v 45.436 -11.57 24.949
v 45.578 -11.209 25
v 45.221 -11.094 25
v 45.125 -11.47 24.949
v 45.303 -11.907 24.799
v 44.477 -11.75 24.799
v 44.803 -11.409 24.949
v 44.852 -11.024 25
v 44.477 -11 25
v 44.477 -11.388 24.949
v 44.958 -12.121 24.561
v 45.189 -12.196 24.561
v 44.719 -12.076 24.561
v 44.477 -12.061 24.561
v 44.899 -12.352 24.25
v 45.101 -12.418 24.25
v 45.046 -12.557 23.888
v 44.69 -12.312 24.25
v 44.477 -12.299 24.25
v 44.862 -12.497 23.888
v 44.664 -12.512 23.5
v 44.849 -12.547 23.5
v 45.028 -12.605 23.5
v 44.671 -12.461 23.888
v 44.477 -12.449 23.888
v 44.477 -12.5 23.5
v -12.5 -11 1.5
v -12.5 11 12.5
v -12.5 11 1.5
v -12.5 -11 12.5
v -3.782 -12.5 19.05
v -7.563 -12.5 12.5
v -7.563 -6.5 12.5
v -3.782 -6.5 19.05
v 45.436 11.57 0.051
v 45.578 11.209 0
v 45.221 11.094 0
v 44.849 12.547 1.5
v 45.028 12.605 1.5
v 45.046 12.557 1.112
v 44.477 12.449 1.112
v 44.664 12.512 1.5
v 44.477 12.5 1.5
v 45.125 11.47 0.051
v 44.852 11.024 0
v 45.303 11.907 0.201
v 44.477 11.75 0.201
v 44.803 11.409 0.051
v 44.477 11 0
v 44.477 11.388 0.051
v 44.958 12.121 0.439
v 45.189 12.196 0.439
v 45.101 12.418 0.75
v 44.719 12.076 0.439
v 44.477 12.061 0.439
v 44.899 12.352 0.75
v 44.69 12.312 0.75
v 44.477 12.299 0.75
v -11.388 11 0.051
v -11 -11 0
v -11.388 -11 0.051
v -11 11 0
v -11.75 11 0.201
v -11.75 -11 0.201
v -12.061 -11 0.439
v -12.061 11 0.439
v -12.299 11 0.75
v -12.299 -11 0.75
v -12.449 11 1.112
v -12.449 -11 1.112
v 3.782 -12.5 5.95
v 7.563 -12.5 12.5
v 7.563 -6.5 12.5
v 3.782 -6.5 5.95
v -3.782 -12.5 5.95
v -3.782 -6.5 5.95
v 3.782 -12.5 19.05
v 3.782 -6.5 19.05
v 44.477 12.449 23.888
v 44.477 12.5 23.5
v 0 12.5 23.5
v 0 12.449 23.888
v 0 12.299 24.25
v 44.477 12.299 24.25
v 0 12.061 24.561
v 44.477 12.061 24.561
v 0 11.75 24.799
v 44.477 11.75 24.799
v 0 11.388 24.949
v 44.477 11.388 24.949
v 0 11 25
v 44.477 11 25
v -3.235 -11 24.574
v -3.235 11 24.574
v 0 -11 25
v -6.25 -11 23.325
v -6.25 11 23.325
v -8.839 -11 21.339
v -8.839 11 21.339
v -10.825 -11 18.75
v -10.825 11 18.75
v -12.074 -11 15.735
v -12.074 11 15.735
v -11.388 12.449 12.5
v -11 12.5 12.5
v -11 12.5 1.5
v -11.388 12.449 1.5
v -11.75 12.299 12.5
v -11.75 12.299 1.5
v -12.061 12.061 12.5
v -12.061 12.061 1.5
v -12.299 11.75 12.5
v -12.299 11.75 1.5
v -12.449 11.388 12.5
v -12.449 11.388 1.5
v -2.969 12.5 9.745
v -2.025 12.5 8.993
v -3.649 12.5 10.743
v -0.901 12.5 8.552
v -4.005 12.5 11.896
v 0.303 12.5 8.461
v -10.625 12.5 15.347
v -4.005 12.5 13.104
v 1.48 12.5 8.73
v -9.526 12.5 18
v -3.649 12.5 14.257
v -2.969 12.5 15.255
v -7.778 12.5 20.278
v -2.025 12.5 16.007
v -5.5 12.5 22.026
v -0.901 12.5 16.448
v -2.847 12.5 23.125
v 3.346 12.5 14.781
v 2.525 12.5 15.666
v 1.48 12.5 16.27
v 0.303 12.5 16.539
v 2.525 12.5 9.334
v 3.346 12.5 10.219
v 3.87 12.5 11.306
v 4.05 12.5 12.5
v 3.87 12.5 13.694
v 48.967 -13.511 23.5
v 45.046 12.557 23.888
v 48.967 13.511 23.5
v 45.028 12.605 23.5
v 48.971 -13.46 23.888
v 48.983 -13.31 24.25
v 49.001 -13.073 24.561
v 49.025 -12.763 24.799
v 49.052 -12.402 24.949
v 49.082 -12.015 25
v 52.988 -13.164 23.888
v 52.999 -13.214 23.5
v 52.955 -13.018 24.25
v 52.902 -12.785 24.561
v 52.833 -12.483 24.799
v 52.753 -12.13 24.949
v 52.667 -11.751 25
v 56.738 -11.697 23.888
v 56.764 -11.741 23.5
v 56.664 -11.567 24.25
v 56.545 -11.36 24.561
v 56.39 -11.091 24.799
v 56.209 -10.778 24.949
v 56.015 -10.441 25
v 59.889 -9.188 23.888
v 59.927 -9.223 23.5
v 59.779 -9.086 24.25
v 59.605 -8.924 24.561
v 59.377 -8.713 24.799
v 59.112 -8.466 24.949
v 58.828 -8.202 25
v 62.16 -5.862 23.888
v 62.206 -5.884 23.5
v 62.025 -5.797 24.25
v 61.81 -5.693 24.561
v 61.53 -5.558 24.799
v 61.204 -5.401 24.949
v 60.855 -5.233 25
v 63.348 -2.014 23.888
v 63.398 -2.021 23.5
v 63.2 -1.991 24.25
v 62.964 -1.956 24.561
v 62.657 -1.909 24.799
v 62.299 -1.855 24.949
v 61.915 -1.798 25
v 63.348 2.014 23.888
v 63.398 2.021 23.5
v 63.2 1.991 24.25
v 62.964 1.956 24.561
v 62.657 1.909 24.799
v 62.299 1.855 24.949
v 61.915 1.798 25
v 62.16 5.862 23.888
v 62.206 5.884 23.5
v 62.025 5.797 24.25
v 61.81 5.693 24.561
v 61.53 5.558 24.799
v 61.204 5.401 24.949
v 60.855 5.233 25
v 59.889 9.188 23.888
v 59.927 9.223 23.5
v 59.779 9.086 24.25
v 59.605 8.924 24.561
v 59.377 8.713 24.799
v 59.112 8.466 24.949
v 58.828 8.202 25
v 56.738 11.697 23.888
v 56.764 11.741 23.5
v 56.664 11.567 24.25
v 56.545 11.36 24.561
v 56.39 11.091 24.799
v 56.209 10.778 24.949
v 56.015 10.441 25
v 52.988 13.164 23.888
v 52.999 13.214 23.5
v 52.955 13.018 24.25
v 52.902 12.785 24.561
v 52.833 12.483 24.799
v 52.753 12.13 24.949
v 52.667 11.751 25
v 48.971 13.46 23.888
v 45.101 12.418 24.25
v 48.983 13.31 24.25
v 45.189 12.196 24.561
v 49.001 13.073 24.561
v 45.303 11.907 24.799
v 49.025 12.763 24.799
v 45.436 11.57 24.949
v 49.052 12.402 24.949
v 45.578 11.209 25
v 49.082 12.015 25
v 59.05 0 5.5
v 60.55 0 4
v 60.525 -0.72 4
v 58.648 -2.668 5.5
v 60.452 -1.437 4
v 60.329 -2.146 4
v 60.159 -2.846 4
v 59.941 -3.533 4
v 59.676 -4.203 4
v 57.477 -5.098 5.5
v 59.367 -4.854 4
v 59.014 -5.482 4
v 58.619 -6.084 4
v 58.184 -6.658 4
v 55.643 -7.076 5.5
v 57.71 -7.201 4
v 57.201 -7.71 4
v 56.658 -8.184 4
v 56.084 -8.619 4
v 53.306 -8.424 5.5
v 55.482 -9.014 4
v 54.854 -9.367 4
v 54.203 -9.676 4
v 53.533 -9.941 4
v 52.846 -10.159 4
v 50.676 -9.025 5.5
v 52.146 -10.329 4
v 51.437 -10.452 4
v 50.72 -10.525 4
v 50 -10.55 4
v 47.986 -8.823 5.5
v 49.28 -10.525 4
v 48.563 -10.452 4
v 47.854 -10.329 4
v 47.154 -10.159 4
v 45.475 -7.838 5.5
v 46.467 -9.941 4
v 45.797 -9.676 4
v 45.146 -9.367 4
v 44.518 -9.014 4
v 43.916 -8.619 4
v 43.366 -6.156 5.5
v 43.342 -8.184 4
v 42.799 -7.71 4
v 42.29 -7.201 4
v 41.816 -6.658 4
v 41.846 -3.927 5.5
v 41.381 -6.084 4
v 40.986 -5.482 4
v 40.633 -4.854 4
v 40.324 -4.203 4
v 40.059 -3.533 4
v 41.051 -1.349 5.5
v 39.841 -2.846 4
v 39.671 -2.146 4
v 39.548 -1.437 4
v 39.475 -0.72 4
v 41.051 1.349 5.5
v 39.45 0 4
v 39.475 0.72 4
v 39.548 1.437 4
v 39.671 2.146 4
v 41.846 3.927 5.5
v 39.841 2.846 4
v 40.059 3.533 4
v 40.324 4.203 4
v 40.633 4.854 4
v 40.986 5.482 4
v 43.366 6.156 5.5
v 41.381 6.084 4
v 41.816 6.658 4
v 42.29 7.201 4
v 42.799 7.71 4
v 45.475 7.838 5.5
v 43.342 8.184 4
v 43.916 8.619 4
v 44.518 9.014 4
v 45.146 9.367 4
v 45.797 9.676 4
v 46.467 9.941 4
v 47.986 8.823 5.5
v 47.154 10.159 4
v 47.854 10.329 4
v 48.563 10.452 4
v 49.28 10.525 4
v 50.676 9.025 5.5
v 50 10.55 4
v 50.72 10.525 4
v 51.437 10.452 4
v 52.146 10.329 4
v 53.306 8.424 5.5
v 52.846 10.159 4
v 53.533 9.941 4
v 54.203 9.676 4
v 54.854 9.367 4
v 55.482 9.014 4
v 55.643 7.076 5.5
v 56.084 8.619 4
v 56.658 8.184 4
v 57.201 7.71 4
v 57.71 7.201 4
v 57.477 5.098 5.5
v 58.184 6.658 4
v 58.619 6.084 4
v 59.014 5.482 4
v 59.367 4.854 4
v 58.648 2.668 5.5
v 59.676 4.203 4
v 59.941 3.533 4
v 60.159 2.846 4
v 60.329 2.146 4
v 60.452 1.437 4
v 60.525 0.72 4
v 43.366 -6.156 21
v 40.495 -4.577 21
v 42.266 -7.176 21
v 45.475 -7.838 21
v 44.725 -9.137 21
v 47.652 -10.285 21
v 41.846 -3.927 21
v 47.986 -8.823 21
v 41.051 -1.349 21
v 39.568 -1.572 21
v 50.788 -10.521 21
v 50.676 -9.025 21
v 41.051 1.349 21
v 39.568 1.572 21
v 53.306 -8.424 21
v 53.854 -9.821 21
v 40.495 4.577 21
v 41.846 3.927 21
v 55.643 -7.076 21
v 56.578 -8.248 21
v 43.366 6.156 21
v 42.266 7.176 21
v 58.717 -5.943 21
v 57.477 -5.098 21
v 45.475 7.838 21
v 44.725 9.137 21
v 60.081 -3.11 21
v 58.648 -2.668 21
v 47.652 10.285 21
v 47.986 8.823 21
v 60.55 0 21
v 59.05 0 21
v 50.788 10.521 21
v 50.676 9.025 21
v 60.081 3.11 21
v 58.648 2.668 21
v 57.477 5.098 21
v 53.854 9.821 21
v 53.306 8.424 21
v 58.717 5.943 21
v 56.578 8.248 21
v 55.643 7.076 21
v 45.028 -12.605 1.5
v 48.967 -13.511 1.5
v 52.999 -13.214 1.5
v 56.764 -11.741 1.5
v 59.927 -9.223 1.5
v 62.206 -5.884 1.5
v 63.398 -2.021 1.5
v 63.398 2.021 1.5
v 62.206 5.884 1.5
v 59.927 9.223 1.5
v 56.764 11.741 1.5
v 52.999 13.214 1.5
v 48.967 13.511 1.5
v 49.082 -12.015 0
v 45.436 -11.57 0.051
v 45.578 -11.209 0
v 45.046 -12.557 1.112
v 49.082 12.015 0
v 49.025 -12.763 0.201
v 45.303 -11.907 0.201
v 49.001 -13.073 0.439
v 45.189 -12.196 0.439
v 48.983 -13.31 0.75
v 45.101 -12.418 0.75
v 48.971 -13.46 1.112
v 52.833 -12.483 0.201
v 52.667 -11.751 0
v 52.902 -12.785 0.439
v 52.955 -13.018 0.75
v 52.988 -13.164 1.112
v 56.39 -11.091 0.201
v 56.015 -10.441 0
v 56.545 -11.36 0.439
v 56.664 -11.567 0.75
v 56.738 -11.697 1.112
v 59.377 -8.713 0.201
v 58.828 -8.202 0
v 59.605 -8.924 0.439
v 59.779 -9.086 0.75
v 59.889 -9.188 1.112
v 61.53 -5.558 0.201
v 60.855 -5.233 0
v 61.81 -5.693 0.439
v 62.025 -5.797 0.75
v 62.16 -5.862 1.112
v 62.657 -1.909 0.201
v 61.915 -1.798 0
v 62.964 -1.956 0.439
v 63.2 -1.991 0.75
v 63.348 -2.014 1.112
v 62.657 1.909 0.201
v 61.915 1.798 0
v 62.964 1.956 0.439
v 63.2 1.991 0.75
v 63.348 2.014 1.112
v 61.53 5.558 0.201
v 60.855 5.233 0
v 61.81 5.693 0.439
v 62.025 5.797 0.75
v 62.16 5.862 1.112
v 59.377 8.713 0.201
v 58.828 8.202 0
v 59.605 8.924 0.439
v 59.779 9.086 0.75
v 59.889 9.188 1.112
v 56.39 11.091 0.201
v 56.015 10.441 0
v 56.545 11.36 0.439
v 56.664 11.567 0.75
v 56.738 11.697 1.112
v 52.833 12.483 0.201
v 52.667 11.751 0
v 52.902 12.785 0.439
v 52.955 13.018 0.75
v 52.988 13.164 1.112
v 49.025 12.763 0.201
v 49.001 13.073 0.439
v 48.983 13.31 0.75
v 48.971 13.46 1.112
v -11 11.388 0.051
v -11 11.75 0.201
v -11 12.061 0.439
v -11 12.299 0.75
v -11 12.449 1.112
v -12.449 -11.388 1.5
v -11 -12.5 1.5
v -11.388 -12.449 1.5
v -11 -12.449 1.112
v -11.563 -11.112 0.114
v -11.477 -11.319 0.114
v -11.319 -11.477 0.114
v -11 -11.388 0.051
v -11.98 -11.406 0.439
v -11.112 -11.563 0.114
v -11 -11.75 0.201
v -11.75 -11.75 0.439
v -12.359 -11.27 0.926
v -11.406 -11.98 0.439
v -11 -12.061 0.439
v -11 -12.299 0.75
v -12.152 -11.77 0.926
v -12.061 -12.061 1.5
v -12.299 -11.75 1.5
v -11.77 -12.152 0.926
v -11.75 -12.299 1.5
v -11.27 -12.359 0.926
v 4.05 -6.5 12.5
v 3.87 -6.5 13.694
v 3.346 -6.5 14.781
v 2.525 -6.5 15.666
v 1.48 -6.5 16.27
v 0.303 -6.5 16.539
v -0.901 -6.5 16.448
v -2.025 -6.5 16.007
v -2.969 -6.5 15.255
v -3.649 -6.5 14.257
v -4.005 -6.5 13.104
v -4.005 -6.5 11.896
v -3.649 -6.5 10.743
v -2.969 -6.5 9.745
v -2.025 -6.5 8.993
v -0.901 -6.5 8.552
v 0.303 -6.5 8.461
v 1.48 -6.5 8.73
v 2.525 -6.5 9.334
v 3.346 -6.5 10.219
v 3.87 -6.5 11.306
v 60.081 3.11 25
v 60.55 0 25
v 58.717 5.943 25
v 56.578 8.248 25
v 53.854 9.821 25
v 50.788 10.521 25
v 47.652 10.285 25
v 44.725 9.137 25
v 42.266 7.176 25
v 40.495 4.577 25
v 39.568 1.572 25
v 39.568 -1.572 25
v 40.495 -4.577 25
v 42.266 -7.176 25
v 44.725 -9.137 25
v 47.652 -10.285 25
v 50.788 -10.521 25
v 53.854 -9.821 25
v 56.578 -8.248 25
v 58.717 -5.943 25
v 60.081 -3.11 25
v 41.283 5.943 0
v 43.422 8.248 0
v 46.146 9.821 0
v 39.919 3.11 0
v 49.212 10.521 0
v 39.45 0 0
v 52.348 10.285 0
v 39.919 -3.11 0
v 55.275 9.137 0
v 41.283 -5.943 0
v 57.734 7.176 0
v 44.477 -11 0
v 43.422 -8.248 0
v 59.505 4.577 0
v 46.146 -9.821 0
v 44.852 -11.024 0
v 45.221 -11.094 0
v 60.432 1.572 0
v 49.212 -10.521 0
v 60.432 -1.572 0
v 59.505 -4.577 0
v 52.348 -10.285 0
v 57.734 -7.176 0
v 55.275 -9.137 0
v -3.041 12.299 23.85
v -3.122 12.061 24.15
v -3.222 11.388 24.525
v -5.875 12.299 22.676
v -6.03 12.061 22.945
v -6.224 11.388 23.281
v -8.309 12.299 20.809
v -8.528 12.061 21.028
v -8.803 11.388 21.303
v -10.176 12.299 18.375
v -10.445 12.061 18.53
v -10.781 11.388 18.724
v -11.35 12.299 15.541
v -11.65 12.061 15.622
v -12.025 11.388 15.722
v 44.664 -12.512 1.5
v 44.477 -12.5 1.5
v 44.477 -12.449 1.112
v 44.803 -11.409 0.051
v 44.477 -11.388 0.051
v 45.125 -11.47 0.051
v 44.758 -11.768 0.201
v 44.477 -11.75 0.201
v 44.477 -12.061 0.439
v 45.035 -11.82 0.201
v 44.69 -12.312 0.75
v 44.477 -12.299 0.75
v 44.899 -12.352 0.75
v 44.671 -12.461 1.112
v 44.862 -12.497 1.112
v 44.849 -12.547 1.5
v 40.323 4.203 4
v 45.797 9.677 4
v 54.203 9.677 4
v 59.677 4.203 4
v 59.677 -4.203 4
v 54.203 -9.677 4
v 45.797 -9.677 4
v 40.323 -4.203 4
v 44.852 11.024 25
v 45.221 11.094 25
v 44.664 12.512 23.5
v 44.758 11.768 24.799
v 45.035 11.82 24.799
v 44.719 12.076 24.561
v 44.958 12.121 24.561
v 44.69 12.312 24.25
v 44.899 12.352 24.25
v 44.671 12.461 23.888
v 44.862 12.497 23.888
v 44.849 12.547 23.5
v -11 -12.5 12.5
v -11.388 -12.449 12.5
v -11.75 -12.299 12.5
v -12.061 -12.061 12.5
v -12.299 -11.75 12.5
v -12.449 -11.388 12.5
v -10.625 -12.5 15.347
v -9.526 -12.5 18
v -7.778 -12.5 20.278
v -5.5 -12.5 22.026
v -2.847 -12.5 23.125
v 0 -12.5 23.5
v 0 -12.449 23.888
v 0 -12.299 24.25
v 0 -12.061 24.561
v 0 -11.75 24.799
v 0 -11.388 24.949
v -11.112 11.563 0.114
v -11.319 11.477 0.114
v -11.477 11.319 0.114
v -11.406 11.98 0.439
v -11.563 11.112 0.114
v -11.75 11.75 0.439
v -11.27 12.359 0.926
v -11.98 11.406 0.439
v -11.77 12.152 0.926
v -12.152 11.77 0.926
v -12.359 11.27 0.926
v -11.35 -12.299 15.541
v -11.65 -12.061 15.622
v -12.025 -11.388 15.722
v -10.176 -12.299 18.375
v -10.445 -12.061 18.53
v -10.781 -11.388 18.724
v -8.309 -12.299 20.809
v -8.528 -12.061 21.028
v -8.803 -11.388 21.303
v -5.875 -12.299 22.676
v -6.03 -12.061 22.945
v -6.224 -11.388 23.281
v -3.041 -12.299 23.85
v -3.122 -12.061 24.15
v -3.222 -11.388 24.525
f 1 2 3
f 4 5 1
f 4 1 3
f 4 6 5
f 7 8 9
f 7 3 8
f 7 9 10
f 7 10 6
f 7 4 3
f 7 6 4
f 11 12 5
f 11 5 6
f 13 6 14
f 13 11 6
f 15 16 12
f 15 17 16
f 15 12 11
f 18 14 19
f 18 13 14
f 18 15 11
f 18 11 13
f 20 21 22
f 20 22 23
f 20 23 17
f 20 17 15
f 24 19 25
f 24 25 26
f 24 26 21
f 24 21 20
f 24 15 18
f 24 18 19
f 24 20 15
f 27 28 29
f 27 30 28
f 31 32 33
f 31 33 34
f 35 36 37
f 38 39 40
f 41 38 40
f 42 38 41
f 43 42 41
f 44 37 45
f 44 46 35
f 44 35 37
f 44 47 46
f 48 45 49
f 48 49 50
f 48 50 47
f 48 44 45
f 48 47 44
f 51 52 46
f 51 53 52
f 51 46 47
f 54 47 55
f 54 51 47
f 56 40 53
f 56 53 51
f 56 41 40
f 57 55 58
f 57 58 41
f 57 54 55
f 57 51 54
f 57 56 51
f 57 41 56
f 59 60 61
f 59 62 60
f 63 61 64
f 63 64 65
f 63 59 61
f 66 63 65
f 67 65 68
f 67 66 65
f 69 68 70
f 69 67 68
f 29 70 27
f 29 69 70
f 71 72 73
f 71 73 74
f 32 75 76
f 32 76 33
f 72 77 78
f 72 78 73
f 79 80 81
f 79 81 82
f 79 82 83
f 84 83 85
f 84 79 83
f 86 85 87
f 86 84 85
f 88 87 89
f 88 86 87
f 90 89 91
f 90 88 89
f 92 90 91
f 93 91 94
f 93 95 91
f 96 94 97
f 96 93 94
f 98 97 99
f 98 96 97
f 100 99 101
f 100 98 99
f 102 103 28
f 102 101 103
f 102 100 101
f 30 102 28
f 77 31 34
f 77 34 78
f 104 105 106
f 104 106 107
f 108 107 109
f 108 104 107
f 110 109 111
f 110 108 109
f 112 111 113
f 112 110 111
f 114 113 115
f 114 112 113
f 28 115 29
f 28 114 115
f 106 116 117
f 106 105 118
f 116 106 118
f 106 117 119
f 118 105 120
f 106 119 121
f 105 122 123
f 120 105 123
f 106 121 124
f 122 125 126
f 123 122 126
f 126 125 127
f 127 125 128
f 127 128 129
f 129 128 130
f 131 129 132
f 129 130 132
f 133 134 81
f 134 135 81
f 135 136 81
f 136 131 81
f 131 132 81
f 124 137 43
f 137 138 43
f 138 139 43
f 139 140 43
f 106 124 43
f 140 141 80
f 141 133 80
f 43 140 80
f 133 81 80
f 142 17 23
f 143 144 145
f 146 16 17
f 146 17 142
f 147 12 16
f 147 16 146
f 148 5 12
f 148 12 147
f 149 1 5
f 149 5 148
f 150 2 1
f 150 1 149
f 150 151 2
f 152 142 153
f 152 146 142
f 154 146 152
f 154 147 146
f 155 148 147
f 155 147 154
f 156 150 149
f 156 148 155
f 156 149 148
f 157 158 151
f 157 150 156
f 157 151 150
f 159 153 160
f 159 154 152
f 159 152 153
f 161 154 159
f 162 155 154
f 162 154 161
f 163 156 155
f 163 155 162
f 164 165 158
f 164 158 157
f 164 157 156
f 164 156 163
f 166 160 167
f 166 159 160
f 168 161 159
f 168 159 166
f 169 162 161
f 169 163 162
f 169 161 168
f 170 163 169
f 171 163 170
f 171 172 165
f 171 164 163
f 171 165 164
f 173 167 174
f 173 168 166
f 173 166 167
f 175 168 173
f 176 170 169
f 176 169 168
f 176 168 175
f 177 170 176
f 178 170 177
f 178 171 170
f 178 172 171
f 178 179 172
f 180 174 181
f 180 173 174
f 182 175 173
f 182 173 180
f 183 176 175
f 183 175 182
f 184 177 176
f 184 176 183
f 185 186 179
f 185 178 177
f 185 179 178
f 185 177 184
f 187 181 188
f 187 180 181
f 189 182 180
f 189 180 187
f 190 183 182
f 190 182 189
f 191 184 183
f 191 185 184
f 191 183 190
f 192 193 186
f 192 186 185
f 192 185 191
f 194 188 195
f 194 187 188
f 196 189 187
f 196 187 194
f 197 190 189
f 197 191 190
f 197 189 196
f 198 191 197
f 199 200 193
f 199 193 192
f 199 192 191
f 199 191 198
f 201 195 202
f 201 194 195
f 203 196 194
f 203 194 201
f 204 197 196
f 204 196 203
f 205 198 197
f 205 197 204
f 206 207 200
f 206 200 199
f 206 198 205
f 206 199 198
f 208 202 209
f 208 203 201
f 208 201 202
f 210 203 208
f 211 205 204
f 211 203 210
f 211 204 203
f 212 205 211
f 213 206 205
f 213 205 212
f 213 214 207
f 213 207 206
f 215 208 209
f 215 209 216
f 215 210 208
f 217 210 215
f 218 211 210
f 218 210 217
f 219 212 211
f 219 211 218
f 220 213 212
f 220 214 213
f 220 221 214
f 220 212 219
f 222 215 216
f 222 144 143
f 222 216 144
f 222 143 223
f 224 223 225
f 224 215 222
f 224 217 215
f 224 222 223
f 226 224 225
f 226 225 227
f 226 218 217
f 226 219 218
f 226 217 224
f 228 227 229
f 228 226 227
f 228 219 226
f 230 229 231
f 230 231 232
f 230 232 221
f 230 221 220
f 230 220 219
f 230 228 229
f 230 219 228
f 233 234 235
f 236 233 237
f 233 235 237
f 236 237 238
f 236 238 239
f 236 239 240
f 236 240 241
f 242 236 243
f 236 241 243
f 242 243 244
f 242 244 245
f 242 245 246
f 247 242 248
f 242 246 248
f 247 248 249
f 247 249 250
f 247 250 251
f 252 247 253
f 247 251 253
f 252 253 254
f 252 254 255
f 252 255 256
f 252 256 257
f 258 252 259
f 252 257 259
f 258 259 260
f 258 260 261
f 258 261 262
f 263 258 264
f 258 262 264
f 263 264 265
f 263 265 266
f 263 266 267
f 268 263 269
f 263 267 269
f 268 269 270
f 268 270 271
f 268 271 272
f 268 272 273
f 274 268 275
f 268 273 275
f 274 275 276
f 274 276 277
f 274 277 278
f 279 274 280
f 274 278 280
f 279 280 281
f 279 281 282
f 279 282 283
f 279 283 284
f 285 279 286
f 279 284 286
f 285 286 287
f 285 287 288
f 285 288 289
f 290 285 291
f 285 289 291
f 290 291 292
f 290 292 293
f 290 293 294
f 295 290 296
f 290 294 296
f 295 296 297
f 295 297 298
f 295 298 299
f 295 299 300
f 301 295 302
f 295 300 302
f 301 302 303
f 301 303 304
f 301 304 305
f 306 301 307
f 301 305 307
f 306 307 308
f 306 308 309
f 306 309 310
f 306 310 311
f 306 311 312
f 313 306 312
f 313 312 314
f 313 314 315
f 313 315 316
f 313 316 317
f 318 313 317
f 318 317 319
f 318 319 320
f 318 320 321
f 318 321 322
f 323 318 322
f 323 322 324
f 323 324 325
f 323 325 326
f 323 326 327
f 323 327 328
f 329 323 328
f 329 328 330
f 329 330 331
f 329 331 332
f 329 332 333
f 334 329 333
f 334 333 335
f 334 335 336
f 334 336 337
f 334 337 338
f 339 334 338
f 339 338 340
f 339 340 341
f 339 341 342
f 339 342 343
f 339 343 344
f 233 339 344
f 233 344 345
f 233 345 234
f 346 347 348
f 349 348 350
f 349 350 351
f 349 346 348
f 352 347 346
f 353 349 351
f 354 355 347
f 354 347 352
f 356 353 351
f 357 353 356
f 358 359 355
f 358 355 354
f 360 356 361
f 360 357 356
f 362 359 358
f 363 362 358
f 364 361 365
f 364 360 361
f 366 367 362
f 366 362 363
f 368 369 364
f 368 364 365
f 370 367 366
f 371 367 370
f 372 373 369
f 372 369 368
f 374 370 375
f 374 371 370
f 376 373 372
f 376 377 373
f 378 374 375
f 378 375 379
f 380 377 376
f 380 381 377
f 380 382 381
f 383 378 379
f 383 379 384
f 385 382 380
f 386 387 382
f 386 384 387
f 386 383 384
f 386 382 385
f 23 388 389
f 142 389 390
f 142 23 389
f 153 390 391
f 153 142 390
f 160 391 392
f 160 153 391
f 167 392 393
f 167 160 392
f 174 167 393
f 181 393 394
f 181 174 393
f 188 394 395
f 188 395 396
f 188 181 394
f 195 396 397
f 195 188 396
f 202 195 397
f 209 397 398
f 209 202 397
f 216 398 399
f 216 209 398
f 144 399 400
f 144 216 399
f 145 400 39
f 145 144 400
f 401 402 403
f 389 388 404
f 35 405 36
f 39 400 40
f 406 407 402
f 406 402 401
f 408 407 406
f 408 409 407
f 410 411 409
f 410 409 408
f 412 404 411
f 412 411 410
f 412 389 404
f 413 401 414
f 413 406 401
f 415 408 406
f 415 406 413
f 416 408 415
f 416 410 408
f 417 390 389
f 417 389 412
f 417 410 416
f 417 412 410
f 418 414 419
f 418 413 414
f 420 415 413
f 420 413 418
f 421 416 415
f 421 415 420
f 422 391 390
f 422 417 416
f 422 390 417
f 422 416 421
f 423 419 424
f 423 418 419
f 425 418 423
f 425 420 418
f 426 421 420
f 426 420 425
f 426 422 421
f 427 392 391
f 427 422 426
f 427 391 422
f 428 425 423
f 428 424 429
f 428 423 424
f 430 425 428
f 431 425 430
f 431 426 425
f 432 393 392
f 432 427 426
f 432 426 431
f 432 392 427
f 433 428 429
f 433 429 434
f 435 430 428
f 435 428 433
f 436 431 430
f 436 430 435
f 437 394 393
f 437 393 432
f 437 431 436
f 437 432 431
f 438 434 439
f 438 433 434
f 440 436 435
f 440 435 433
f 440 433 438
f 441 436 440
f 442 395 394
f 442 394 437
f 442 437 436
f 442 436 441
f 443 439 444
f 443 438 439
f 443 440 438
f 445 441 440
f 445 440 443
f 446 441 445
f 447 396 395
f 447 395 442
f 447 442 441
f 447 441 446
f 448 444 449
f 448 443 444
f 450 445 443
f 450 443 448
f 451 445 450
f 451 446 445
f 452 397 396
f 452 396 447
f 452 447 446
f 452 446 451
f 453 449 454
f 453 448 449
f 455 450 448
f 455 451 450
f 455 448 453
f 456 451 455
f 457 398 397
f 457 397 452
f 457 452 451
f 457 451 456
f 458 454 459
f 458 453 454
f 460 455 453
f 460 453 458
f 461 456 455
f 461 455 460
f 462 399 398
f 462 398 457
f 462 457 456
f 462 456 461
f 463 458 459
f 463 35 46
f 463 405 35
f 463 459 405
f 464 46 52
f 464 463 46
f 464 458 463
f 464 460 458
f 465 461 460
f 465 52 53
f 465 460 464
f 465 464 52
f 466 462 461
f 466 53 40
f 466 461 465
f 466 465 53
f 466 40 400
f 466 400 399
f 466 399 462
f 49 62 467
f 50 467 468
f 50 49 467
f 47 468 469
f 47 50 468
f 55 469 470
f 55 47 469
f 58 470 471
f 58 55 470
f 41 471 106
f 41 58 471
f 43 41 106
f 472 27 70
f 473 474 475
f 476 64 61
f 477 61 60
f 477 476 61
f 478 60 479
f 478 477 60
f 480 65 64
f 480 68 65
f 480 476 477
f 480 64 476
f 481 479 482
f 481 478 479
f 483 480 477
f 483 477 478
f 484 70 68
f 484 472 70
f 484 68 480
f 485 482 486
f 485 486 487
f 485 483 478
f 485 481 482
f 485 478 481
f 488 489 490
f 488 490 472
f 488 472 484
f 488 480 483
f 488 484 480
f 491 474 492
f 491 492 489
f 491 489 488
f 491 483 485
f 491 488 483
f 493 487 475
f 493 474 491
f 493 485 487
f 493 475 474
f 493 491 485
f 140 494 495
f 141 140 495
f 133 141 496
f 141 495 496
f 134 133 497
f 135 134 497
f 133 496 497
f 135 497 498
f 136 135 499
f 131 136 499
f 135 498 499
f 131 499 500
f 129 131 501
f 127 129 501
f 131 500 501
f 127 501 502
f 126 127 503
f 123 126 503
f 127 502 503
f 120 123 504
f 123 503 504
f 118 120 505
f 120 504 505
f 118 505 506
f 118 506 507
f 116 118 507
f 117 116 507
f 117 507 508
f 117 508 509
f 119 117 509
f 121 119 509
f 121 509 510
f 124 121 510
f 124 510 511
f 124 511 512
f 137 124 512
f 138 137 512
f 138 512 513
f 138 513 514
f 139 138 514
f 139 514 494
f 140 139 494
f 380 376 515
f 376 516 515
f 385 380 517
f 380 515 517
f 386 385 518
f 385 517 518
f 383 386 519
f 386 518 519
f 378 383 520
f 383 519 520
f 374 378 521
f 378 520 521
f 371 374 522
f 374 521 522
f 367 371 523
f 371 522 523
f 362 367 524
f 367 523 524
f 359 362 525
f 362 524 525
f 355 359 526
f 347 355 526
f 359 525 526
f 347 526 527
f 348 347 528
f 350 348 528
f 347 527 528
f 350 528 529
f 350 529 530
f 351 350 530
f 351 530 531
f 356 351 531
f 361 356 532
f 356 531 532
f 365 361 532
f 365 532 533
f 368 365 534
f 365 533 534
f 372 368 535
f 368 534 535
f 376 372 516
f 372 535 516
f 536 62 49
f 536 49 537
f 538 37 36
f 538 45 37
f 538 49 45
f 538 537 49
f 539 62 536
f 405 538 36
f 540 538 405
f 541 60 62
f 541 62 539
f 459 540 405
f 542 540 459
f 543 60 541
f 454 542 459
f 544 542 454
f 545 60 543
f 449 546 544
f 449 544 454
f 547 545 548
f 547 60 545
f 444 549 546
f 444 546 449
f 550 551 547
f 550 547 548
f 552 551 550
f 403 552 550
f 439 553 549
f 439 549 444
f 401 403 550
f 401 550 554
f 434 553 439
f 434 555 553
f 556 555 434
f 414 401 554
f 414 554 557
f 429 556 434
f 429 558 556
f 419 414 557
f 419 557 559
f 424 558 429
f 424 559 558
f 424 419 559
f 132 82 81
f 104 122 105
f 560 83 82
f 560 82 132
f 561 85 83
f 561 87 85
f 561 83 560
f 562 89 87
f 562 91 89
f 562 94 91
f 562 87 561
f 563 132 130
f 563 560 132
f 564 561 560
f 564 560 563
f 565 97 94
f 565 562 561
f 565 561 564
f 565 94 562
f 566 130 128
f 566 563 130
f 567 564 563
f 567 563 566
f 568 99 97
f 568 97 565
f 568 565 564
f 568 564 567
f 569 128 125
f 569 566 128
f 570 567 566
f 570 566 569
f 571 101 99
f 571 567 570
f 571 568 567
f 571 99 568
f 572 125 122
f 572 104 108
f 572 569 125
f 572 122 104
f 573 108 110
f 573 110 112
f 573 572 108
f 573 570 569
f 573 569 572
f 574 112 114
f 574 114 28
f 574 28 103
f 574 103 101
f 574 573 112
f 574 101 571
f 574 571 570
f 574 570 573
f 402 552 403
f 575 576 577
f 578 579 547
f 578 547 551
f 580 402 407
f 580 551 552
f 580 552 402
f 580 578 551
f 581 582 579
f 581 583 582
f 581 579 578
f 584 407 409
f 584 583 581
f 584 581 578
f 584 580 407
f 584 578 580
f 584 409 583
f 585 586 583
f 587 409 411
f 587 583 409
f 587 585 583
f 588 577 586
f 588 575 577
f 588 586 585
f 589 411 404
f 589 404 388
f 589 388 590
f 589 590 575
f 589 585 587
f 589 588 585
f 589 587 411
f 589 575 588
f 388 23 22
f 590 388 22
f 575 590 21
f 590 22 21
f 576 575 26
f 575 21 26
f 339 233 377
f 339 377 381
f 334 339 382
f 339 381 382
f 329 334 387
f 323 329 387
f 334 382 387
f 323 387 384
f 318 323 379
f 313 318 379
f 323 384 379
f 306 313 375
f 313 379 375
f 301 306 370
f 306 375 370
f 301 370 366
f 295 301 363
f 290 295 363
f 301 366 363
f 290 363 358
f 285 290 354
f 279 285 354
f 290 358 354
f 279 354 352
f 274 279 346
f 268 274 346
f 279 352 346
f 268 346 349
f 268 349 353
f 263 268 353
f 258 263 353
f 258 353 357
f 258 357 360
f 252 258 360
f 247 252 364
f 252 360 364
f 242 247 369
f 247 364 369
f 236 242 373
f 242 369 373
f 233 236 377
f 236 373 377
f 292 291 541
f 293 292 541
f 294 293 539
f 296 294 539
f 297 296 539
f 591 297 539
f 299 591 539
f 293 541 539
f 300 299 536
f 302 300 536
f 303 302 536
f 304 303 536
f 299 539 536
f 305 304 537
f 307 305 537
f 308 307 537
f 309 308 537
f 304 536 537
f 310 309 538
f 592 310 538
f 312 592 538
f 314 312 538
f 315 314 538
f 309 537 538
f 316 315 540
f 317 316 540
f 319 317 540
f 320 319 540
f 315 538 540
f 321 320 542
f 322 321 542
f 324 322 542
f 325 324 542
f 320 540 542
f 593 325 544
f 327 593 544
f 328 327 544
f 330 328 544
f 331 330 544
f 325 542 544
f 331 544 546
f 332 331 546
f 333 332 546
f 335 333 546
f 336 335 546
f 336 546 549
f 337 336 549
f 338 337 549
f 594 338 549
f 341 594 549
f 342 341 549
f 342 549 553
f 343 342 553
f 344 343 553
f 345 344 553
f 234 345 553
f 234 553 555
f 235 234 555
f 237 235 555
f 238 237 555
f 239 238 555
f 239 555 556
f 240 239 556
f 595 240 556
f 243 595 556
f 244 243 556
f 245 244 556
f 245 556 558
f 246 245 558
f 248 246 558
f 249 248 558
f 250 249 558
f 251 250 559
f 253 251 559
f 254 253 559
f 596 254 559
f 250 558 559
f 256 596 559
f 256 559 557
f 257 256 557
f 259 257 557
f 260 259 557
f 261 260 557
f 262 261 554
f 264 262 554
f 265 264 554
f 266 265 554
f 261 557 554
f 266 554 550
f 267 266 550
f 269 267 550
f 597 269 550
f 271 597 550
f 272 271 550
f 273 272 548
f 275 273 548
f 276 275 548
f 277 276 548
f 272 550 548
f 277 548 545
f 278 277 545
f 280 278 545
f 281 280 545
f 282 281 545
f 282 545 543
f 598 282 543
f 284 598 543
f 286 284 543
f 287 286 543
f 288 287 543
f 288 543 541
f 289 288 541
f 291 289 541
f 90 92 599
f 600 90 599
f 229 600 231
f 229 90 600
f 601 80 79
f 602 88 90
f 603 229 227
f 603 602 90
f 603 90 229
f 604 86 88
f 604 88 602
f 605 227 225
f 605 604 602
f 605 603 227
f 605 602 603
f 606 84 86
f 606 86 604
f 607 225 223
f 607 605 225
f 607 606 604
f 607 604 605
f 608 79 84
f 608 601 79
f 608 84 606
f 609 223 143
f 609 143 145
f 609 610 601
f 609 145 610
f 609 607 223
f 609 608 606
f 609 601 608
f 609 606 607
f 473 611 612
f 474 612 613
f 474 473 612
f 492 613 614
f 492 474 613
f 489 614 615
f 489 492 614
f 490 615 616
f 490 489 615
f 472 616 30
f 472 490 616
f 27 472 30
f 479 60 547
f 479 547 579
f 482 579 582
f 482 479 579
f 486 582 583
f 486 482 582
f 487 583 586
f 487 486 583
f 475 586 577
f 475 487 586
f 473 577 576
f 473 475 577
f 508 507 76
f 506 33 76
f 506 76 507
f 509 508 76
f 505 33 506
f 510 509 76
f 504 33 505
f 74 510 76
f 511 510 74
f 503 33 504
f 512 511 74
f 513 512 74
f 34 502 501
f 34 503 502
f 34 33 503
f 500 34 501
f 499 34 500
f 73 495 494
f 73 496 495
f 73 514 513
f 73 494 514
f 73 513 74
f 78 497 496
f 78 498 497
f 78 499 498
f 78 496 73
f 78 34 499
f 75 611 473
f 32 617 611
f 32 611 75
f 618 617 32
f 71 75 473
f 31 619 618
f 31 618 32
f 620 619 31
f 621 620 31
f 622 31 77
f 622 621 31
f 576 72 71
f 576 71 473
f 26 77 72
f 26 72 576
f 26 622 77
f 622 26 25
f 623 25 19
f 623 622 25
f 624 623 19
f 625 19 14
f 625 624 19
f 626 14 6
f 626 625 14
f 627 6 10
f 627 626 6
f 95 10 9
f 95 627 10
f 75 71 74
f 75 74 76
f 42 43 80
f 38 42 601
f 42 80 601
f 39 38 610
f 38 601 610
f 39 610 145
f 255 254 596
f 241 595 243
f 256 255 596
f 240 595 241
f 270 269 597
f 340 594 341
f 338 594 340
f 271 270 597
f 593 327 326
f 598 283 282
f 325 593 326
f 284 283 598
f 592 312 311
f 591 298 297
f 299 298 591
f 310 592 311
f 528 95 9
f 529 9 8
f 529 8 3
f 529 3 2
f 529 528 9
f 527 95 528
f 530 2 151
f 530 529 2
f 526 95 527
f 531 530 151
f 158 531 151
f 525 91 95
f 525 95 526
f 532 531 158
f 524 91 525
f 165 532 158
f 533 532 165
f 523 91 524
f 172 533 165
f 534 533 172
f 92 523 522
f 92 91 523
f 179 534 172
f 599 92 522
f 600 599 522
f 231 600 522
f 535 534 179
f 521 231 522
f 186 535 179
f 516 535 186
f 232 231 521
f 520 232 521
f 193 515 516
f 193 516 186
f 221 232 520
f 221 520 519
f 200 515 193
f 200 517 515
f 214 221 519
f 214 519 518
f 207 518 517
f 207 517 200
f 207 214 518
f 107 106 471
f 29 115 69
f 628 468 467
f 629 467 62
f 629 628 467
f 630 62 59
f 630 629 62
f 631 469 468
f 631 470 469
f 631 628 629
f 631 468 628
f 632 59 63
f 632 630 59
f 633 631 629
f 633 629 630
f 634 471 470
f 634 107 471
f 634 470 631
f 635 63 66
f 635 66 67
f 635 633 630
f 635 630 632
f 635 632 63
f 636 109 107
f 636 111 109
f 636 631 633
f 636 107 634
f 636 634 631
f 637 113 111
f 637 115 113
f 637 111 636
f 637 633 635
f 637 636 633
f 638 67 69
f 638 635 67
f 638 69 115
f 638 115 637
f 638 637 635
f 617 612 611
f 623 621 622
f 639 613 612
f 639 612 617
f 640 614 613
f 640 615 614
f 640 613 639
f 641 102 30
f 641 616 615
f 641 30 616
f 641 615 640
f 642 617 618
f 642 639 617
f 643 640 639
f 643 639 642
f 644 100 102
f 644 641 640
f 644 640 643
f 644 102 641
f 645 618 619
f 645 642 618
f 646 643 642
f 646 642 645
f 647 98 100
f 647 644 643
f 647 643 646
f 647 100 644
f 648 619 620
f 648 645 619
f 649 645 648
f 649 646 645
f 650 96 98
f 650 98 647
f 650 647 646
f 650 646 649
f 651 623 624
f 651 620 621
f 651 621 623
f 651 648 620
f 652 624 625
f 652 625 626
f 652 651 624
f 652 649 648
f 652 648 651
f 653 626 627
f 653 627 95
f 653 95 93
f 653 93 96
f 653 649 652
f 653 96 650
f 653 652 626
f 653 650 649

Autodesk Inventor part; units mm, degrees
ref_plane "YZ Plane" through (0, 0, 0) normal (1, 0, 0) x (0, 1, 0)
ref_plane "XZ Plane" through (0, 0, 0) normal (0, 1, 0) x (-1, 0, 0)
ref_plane "XY Plane" through (0, 0, 0) normal (0, 0, 1) x (1, 0, 0)
sketch "Sketch1" plane through (0, 0, 0) normal (0, 0, 1) x (1, 0, 0)
  line L0 (0, 0) -> (0, 12.5)
  line L1 (0, 12.5) -> (50, 12.5)
  arc A0 (50, -12.5) -> (50, 12.5) centre (50, 0) ccw
  line L2 (50, -12.5) -> (0, -12.5)
  line L3 (0, -12.5) -> (0, 0)
  dimension "d0" = 12.5
  dimension "d2" = 50
extrude "Extrusion1" add sketch "Sketch1" along normal blind 25
sketch "Sketch2" plane through (0, -12.5, 0) normal (0, -1, 0) x (1, 0, 0)
  line L0 (0, 0) -> (0, 25) projected
  circle A0 centre (0, 12.5) radius 12.5
extrude "Extrusion2" add sketch "Sketch2" against normal up to surface (25 mm away)
sketch "Sketch3" plane through (50, -12.5, 0) normal (0, -1, 0) x (1, 0, 0)
  arc A0 (-50, 25) -> (-50, 0) centre (-50, 12.5) ccw projected
  circle A1 centre (-50, 12.5) radius 4.05
  dimension "d7" = 8.1
extrude "Extrusion3" cut sketch "Sketch3" against normal through all
sketch "Sketch4" plane through (0, 0, 25) normal (0, 0, 1) x (1, 0, 0)
  arc A0 (50, -12.5) -> (50, 12.5) centre (50, 0) ccw projected
  circle A1 centre (50, 0) radius 9.05
  point P0 (0, 0)
  dimension "d11" = 18.1
extrude "Extrusion4" cut sketch "Sketch4" against normal through all
sketch "Sketch16" plane through (50, -12.5, 0) normal (0, -1, 0) x (1, 0, 0)
  circle A0 centre (-50, 12.5) radius 4.05 projected
  arc A1 (-50, 25) -> (-50, 0) centre (-50, 12.5) ccw projected
  line L0 (-57.5633, 12.5) -> (-53.7816, 19.05)
  line L1 (-53.7816, 19.05) -> (-46.2184, 19.05)
  line L2 (-46.2184, 19.05) -> (-42.4367, 12.5)
  line L3 (-42.4367, 12.5) -> (-46.2184, 5.95)
  line L4 (-46.2184, 5.95) -> (-53.7816, 5.95)
  line L5 (-53.7816, 5.95) -> (-57.5633, 12.5)
  dimension "d74" = 13.1
extrude "Extrusion14" cut sketch "Sketch16" against normal blind 6
sketch "Sketch17" plane through (0, 0, 25) normal (0, 0, 1) x (1, 0, 0)
  circle A0 centre (50, 0) radius 9.05 projected
  arc A1 (50, -12.5) -> (50, 12.5) centre (50, 0) ccw projected
  circle A2 centre (50, 0) radius 10.55
  point P0 (0, 0)
  dimension "d78" = 21.1
extrude "Extrusion15" cut sketch "Sketch17" against normal blind 4
sketch "Sketch19" plane through (0, 0, 0) normal (0, 0, -1) x (-1, 0, 0)
  circle A0 centre (-50, 0) radius 9.05 projected
  circle A1 centre (-50, 0) radius 10.55 projected
  point P0 (0, 0)
extrude "Extrusion16" cut sketch "Sketch19" against normal blind 4
chamfer "Chamfer2" distance 1.5 angle 45 1 edges at (40.95, 0, 4)
sketch "Sketch20" plane through (0, 0, 25) normal (0, 0, 1) x (1, 0, 0)
  circle A0 centre (50, 0) radius 10.55 projected
  arc A1 (50, -12.5) -> (50, 12.5) centre (50, 0) ccw projected
  circle A2 centre (50, 0) radius 13.55
  point P0 (0, 0)
  dimension "d87" = 3
extrude "Extrusion17" add sketch "Sketch20" against normal up to surface (25 mm away)
sketch "Sketch21" plane through (0, -12.5, 12.5) normal (0, -1, 0) x (1, 0, 0)
  arc A0 (0, 12.5) -> (0, -12.5) centre (0, 0) ccw projected
  line L0 (44.77, -12.5) -> (0, -12.5) projected
  line L1 (3.7816, -6.55) -> (-3.7816, -6.55) projected
  line L2 (-12.5, 0) -> (-12.5, -12.5)
  line L3 (-12.5, -12.5) -> (0, -12.5)
extrude "Extrusion18" add sketch "Sketch21" against normal up to surface (25 mm away)
fillet "Fillet1" radius 1.5 11 edges at (22.385, 12.5, 25) (22.385, -12.5, 25) (63.55, 0, 25) (-8.8388, 12.5, 21.3388) (16.135, 12.5, 0) (-8.8388, -12.5, 21.3388) (16.135, -12.5, 0) (44.77, 12.5, 12.5) (44.77, -12.5, 12.5) (63.55, 0, 0) (-12.5, 0, 0)
properties part number "hub center"
